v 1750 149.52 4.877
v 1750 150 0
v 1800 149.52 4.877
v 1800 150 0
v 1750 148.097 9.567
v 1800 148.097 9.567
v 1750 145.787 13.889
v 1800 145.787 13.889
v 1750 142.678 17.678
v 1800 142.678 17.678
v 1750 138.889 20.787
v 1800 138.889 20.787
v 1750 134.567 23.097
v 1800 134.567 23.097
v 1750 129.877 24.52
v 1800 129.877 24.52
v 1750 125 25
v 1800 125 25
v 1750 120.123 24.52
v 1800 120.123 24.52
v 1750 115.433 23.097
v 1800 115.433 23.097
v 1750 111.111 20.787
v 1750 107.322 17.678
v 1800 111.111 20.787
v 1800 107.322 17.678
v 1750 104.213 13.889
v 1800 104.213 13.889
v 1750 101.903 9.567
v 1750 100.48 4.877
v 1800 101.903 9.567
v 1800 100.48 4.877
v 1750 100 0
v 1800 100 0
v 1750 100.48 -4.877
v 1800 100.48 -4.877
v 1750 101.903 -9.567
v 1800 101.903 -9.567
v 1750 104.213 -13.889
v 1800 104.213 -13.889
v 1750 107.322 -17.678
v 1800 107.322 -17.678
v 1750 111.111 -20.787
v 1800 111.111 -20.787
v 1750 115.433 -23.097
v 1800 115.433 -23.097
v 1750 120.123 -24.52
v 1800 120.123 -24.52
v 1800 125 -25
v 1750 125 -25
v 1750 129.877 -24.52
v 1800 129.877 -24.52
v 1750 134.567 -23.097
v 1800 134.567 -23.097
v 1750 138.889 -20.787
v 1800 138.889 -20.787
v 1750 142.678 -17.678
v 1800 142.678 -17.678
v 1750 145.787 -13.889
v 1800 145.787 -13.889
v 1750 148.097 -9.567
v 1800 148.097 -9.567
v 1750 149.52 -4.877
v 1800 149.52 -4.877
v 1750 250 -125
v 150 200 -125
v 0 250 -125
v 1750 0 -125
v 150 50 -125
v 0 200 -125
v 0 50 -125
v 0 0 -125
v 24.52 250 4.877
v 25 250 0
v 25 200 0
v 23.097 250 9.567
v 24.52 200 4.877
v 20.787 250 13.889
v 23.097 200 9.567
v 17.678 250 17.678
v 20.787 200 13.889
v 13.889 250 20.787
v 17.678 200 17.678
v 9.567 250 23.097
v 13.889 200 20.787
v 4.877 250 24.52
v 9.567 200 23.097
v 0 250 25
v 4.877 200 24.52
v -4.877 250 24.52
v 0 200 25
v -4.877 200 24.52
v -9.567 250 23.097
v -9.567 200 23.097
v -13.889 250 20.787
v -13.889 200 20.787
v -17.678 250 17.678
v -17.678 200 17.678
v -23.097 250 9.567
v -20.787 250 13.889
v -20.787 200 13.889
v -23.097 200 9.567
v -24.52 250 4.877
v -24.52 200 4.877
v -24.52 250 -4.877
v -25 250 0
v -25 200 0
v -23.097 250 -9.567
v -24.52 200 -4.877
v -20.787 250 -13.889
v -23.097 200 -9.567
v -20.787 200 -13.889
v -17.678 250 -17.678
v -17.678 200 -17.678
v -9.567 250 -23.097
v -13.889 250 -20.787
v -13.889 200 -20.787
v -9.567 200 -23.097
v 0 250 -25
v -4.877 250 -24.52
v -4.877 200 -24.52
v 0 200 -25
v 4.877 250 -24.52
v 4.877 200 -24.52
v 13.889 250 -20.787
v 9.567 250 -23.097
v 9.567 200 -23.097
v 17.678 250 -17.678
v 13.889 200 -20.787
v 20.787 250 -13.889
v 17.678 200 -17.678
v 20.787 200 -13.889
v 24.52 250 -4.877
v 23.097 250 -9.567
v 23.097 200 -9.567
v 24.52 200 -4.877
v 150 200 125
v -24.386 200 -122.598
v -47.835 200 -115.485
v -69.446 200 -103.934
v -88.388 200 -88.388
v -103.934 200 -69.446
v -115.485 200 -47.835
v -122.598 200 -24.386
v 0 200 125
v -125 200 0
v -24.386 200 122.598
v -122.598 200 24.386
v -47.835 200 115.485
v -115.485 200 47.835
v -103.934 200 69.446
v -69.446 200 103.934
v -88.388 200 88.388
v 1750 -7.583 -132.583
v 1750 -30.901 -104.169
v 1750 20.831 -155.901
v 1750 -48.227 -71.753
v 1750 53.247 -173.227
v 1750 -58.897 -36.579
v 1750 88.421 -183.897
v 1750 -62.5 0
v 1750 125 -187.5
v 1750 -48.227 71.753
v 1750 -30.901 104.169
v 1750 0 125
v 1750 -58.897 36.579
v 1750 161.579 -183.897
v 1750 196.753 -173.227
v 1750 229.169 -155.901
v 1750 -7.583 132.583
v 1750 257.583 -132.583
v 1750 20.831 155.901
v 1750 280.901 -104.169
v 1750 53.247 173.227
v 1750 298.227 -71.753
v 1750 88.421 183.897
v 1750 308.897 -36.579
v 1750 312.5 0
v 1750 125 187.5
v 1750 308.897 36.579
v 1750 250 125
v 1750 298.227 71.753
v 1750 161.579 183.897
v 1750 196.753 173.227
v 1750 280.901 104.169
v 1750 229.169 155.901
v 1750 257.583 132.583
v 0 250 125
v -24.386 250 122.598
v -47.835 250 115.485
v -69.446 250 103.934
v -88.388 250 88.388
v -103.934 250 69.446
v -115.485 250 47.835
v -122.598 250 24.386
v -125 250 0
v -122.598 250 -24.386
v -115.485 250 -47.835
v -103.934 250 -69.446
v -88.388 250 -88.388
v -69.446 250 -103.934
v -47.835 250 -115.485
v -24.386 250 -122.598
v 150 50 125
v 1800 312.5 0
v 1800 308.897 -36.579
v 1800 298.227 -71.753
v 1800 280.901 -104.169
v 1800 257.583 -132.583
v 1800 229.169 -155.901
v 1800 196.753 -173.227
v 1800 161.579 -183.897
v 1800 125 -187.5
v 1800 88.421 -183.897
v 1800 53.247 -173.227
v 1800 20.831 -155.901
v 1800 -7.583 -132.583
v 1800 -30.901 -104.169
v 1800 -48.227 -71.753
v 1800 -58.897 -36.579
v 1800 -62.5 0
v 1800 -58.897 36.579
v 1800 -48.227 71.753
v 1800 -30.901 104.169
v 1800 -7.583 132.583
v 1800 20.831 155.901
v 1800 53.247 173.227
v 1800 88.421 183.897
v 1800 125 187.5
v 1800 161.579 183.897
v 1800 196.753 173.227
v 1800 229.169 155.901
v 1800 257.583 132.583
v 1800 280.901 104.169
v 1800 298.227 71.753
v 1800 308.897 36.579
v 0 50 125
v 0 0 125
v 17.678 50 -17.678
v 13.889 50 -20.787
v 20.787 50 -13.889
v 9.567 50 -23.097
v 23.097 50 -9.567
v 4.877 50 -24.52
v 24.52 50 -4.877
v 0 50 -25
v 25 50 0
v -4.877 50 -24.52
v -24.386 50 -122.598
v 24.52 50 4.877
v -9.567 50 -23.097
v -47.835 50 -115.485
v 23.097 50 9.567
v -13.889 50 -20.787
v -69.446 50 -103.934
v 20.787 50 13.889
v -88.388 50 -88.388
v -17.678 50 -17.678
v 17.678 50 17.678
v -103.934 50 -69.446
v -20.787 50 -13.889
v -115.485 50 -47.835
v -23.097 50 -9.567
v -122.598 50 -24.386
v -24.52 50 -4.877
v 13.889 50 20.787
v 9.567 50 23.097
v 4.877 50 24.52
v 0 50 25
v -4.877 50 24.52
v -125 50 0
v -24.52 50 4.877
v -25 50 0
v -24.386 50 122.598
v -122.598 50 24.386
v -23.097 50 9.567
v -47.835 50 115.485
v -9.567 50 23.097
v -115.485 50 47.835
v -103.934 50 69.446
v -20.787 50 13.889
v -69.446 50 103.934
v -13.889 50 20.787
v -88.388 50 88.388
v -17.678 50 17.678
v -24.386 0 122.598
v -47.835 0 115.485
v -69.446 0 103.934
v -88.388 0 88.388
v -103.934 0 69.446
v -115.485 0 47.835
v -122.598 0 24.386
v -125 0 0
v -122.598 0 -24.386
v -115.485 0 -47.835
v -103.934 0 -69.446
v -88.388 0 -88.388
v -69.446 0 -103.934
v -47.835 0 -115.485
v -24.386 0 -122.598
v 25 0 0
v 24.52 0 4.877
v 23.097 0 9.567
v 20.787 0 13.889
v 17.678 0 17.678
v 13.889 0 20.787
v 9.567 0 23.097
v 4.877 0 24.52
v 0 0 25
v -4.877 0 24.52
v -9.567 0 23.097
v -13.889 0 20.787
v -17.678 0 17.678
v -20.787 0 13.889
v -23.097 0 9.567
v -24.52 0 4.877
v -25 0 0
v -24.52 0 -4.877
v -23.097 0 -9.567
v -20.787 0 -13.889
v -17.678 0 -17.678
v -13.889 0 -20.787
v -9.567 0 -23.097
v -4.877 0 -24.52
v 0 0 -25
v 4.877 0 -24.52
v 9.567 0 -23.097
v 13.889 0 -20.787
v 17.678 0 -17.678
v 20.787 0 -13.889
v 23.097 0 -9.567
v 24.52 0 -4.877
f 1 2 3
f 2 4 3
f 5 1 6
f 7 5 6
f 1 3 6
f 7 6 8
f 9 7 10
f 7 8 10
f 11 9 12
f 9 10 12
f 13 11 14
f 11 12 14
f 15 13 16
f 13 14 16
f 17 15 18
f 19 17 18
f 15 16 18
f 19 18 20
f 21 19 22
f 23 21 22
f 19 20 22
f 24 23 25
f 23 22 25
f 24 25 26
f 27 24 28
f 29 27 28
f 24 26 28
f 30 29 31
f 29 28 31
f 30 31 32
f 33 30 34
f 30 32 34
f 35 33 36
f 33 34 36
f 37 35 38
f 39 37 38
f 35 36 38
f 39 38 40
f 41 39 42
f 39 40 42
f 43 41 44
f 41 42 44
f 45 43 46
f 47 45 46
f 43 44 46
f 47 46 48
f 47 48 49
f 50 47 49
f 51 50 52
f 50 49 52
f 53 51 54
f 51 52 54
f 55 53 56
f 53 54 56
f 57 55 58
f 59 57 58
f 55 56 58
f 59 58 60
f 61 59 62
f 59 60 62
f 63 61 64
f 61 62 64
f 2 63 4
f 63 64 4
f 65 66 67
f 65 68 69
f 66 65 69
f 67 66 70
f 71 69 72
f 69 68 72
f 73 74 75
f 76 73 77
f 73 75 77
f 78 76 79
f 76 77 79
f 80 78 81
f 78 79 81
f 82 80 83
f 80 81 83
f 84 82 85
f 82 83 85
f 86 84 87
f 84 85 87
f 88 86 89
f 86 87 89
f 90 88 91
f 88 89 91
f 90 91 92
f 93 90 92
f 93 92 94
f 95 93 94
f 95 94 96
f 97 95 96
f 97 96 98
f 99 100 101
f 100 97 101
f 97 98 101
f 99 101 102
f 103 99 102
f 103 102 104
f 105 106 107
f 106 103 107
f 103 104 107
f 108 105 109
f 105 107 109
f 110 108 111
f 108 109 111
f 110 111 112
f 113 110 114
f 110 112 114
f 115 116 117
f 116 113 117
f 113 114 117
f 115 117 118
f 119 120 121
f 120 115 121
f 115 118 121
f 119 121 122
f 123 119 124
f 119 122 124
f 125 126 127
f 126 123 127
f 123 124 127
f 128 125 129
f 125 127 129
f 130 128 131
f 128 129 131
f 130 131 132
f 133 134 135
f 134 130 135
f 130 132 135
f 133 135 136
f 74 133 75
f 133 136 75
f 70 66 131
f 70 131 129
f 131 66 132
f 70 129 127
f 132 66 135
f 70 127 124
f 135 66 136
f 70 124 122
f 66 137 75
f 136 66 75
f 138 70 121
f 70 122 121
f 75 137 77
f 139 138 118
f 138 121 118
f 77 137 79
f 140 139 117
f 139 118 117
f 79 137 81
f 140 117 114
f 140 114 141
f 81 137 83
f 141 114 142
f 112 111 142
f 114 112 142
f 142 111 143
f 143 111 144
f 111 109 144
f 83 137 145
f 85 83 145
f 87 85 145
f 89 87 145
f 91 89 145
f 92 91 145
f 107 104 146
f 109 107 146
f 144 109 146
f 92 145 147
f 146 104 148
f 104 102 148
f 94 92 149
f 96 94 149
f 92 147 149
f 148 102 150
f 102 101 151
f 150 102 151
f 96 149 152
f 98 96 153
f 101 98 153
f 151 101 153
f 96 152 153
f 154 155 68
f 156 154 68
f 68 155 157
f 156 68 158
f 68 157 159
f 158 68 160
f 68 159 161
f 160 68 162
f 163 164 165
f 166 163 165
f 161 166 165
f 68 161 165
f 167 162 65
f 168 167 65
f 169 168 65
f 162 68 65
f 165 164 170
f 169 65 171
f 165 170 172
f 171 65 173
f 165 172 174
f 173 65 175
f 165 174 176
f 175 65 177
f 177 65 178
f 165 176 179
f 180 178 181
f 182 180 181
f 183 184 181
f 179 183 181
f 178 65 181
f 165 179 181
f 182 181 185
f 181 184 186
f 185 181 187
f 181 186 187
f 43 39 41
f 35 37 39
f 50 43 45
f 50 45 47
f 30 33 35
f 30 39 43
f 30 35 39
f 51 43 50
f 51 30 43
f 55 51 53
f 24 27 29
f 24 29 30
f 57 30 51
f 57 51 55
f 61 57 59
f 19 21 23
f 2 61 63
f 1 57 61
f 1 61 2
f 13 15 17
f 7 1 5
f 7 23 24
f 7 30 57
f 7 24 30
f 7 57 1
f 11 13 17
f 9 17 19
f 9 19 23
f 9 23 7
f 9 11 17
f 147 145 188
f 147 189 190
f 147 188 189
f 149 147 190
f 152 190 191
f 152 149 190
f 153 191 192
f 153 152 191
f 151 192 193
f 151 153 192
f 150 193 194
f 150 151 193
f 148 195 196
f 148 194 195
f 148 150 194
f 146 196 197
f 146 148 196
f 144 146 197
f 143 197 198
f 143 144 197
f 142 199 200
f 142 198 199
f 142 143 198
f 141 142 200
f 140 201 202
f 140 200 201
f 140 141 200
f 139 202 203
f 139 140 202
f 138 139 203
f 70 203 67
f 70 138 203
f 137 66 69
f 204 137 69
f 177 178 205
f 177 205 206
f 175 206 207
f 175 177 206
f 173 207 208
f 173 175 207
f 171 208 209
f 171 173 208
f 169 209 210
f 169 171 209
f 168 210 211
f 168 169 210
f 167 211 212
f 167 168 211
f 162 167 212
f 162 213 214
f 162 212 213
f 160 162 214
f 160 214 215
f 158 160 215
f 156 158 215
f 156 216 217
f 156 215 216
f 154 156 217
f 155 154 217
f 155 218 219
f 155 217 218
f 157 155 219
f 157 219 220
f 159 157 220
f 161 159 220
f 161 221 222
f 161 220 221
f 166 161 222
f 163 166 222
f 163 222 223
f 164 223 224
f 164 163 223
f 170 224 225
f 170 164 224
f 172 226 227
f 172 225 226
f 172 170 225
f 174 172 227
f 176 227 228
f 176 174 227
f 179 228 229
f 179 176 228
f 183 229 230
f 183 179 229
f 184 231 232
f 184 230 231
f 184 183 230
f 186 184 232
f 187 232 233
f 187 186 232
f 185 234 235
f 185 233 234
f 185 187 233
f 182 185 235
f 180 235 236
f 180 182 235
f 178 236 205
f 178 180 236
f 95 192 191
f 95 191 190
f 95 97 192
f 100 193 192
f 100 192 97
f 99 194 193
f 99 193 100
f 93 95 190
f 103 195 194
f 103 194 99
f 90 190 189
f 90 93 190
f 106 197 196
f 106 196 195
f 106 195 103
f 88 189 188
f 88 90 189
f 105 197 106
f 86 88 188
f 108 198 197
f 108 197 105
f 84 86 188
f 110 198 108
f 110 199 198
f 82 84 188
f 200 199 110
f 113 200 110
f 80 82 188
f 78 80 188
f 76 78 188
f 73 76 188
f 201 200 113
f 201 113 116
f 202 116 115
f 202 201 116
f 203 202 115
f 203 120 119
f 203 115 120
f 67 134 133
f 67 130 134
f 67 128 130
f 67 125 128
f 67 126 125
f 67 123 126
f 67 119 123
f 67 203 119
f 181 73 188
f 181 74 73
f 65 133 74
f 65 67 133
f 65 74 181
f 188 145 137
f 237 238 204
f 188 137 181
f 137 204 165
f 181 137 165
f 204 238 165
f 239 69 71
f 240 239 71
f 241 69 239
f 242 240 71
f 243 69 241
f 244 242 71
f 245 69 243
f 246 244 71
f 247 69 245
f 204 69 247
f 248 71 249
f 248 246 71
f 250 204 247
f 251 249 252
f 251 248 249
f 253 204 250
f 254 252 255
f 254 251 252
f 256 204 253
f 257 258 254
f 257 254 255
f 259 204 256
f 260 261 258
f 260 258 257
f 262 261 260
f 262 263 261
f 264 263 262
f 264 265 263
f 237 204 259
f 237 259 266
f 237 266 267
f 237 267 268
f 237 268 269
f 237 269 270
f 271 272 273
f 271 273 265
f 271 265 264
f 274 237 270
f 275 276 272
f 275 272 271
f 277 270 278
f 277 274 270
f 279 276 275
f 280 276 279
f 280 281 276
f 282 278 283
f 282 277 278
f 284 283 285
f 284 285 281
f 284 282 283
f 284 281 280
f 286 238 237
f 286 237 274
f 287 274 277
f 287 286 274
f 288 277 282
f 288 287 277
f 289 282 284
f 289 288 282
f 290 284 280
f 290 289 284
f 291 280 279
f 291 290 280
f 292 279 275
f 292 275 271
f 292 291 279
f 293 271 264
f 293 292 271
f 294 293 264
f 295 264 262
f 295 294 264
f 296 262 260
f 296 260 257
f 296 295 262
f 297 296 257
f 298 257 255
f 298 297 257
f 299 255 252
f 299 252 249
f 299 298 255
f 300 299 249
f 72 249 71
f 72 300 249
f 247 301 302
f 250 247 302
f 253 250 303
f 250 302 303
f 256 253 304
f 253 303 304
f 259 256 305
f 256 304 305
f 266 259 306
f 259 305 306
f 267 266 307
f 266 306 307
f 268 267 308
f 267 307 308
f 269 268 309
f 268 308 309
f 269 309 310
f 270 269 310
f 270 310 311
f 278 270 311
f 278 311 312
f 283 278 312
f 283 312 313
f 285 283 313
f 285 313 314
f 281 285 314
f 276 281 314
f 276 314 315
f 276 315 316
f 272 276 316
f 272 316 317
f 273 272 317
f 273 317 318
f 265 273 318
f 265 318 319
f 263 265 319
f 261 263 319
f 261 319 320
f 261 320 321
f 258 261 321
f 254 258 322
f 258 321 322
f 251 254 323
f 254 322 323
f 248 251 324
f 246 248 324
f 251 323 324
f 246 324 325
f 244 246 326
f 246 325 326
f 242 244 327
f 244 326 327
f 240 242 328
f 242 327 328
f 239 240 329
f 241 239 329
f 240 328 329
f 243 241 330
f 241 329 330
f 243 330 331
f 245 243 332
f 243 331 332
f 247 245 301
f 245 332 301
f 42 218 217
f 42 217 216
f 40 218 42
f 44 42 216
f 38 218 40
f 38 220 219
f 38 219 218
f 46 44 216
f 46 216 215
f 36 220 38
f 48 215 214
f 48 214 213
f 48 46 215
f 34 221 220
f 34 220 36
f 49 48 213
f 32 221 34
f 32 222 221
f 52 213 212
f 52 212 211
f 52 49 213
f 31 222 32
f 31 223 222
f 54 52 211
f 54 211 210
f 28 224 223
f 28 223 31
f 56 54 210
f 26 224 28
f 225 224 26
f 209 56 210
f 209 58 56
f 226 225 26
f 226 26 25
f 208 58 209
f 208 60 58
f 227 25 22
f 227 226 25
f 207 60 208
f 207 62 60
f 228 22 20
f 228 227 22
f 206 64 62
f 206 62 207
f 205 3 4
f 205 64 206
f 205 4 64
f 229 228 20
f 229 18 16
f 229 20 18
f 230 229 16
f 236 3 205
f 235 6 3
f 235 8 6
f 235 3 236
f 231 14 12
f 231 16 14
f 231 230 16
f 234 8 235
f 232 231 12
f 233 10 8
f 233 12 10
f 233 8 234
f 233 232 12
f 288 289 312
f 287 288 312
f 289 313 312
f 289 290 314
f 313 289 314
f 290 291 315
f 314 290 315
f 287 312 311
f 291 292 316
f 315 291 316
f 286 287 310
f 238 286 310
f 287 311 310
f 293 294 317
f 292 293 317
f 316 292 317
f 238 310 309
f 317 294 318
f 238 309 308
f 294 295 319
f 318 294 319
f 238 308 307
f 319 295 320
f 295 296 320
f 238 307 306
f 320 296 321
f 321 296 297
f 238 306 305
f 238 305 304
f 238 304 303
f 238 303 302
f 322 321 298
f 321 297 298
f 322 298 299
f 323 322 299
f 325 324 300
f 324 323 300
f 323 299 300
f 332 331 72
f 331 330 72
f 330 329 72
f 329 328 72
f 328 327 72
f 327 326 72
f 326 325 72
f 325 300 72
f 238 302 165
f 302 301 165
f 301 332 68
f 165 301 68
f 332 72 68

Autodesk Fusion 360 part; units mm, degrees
sketch "Sketch2" plane through (0, 0, 0) normal (0, 1, 0) x (1, 0, 0)
  line L0 (0, -50) -> (700, -50)
  arc A0 (700, -50) -> (700, 50) centre (700, 0) ccw
  line L1 (700, 50) -> (0, 50)
  arc A1 (0, 50) -> (0, -50) centre (0, 0) ccw
  line L2 (0, 0) -> (700, 0) construction
  circle A2 centre (0, 0) radius 10
  line L3 (700, -50) -> (700, 50)
  dimension "d2" = 100
  dimension "d3" = 20
extrude "Extrude1" add sketch "Sketch2" along normal blind 100 contours L0 L1 A1 L3
sketch "Sketch3" plane through (0, 0, 50) normal (0, 0, 1) x (-1, 0, 0)
  line L0 (0, 0) -> (-700, 0)
  line L1 (-700, 0) -> (-700, -100)
  line L2 (-700, -100) -> (0, -100)
  line L3 (0, -100) -> (0, 0)
  line L4 (-60, -100) -> (-60, 0)
  line L5 (-60, -80) -> (50, -80)
  line L6 (-60, -20) -> (50, -20)
  line L7 (50, -80) -> (50, -20)
  dimension "d6" = 20
  dimension "d7" = 20
extrude "Extrude2" cut sketch "Sketch3" against normal blind 110 contours L3 L5 L6 L7 | L3 L4 L5 L6
sketch "Sketch4" plane through (700, 0, 0) normal (1, 0, 0) x (0, 1, 0)
  line L0 (0, 50) -> (0, -50)
  line L1 (0, -50) -> (100, -50)
  line L2 (100, -50) -> (100, 50)
  line L3 (100, 50) -> (0, 50)
  circle A0 centre (50, 0) radius 75
  dimension "d10" = 150
extrude "Extrude3" add sketch "Sketch4" along normal blind 20 contours L0 L1 L2 L3 | A0
sketch "Sketch5" plane through (720, 0, 0) normal (1, 0, 0) x (0, 1, 0)
  circle A0 centre (50, 0) radius 75
  circle A1 centre (50, 0) radius 10
  dimension "d13" = 20
extrude "Extrude4" cut sketch "Sketch5" against normal blind 20 contours A1
scale "Scale1" factor 2.5 about (0, 0, 0) bodies 1
